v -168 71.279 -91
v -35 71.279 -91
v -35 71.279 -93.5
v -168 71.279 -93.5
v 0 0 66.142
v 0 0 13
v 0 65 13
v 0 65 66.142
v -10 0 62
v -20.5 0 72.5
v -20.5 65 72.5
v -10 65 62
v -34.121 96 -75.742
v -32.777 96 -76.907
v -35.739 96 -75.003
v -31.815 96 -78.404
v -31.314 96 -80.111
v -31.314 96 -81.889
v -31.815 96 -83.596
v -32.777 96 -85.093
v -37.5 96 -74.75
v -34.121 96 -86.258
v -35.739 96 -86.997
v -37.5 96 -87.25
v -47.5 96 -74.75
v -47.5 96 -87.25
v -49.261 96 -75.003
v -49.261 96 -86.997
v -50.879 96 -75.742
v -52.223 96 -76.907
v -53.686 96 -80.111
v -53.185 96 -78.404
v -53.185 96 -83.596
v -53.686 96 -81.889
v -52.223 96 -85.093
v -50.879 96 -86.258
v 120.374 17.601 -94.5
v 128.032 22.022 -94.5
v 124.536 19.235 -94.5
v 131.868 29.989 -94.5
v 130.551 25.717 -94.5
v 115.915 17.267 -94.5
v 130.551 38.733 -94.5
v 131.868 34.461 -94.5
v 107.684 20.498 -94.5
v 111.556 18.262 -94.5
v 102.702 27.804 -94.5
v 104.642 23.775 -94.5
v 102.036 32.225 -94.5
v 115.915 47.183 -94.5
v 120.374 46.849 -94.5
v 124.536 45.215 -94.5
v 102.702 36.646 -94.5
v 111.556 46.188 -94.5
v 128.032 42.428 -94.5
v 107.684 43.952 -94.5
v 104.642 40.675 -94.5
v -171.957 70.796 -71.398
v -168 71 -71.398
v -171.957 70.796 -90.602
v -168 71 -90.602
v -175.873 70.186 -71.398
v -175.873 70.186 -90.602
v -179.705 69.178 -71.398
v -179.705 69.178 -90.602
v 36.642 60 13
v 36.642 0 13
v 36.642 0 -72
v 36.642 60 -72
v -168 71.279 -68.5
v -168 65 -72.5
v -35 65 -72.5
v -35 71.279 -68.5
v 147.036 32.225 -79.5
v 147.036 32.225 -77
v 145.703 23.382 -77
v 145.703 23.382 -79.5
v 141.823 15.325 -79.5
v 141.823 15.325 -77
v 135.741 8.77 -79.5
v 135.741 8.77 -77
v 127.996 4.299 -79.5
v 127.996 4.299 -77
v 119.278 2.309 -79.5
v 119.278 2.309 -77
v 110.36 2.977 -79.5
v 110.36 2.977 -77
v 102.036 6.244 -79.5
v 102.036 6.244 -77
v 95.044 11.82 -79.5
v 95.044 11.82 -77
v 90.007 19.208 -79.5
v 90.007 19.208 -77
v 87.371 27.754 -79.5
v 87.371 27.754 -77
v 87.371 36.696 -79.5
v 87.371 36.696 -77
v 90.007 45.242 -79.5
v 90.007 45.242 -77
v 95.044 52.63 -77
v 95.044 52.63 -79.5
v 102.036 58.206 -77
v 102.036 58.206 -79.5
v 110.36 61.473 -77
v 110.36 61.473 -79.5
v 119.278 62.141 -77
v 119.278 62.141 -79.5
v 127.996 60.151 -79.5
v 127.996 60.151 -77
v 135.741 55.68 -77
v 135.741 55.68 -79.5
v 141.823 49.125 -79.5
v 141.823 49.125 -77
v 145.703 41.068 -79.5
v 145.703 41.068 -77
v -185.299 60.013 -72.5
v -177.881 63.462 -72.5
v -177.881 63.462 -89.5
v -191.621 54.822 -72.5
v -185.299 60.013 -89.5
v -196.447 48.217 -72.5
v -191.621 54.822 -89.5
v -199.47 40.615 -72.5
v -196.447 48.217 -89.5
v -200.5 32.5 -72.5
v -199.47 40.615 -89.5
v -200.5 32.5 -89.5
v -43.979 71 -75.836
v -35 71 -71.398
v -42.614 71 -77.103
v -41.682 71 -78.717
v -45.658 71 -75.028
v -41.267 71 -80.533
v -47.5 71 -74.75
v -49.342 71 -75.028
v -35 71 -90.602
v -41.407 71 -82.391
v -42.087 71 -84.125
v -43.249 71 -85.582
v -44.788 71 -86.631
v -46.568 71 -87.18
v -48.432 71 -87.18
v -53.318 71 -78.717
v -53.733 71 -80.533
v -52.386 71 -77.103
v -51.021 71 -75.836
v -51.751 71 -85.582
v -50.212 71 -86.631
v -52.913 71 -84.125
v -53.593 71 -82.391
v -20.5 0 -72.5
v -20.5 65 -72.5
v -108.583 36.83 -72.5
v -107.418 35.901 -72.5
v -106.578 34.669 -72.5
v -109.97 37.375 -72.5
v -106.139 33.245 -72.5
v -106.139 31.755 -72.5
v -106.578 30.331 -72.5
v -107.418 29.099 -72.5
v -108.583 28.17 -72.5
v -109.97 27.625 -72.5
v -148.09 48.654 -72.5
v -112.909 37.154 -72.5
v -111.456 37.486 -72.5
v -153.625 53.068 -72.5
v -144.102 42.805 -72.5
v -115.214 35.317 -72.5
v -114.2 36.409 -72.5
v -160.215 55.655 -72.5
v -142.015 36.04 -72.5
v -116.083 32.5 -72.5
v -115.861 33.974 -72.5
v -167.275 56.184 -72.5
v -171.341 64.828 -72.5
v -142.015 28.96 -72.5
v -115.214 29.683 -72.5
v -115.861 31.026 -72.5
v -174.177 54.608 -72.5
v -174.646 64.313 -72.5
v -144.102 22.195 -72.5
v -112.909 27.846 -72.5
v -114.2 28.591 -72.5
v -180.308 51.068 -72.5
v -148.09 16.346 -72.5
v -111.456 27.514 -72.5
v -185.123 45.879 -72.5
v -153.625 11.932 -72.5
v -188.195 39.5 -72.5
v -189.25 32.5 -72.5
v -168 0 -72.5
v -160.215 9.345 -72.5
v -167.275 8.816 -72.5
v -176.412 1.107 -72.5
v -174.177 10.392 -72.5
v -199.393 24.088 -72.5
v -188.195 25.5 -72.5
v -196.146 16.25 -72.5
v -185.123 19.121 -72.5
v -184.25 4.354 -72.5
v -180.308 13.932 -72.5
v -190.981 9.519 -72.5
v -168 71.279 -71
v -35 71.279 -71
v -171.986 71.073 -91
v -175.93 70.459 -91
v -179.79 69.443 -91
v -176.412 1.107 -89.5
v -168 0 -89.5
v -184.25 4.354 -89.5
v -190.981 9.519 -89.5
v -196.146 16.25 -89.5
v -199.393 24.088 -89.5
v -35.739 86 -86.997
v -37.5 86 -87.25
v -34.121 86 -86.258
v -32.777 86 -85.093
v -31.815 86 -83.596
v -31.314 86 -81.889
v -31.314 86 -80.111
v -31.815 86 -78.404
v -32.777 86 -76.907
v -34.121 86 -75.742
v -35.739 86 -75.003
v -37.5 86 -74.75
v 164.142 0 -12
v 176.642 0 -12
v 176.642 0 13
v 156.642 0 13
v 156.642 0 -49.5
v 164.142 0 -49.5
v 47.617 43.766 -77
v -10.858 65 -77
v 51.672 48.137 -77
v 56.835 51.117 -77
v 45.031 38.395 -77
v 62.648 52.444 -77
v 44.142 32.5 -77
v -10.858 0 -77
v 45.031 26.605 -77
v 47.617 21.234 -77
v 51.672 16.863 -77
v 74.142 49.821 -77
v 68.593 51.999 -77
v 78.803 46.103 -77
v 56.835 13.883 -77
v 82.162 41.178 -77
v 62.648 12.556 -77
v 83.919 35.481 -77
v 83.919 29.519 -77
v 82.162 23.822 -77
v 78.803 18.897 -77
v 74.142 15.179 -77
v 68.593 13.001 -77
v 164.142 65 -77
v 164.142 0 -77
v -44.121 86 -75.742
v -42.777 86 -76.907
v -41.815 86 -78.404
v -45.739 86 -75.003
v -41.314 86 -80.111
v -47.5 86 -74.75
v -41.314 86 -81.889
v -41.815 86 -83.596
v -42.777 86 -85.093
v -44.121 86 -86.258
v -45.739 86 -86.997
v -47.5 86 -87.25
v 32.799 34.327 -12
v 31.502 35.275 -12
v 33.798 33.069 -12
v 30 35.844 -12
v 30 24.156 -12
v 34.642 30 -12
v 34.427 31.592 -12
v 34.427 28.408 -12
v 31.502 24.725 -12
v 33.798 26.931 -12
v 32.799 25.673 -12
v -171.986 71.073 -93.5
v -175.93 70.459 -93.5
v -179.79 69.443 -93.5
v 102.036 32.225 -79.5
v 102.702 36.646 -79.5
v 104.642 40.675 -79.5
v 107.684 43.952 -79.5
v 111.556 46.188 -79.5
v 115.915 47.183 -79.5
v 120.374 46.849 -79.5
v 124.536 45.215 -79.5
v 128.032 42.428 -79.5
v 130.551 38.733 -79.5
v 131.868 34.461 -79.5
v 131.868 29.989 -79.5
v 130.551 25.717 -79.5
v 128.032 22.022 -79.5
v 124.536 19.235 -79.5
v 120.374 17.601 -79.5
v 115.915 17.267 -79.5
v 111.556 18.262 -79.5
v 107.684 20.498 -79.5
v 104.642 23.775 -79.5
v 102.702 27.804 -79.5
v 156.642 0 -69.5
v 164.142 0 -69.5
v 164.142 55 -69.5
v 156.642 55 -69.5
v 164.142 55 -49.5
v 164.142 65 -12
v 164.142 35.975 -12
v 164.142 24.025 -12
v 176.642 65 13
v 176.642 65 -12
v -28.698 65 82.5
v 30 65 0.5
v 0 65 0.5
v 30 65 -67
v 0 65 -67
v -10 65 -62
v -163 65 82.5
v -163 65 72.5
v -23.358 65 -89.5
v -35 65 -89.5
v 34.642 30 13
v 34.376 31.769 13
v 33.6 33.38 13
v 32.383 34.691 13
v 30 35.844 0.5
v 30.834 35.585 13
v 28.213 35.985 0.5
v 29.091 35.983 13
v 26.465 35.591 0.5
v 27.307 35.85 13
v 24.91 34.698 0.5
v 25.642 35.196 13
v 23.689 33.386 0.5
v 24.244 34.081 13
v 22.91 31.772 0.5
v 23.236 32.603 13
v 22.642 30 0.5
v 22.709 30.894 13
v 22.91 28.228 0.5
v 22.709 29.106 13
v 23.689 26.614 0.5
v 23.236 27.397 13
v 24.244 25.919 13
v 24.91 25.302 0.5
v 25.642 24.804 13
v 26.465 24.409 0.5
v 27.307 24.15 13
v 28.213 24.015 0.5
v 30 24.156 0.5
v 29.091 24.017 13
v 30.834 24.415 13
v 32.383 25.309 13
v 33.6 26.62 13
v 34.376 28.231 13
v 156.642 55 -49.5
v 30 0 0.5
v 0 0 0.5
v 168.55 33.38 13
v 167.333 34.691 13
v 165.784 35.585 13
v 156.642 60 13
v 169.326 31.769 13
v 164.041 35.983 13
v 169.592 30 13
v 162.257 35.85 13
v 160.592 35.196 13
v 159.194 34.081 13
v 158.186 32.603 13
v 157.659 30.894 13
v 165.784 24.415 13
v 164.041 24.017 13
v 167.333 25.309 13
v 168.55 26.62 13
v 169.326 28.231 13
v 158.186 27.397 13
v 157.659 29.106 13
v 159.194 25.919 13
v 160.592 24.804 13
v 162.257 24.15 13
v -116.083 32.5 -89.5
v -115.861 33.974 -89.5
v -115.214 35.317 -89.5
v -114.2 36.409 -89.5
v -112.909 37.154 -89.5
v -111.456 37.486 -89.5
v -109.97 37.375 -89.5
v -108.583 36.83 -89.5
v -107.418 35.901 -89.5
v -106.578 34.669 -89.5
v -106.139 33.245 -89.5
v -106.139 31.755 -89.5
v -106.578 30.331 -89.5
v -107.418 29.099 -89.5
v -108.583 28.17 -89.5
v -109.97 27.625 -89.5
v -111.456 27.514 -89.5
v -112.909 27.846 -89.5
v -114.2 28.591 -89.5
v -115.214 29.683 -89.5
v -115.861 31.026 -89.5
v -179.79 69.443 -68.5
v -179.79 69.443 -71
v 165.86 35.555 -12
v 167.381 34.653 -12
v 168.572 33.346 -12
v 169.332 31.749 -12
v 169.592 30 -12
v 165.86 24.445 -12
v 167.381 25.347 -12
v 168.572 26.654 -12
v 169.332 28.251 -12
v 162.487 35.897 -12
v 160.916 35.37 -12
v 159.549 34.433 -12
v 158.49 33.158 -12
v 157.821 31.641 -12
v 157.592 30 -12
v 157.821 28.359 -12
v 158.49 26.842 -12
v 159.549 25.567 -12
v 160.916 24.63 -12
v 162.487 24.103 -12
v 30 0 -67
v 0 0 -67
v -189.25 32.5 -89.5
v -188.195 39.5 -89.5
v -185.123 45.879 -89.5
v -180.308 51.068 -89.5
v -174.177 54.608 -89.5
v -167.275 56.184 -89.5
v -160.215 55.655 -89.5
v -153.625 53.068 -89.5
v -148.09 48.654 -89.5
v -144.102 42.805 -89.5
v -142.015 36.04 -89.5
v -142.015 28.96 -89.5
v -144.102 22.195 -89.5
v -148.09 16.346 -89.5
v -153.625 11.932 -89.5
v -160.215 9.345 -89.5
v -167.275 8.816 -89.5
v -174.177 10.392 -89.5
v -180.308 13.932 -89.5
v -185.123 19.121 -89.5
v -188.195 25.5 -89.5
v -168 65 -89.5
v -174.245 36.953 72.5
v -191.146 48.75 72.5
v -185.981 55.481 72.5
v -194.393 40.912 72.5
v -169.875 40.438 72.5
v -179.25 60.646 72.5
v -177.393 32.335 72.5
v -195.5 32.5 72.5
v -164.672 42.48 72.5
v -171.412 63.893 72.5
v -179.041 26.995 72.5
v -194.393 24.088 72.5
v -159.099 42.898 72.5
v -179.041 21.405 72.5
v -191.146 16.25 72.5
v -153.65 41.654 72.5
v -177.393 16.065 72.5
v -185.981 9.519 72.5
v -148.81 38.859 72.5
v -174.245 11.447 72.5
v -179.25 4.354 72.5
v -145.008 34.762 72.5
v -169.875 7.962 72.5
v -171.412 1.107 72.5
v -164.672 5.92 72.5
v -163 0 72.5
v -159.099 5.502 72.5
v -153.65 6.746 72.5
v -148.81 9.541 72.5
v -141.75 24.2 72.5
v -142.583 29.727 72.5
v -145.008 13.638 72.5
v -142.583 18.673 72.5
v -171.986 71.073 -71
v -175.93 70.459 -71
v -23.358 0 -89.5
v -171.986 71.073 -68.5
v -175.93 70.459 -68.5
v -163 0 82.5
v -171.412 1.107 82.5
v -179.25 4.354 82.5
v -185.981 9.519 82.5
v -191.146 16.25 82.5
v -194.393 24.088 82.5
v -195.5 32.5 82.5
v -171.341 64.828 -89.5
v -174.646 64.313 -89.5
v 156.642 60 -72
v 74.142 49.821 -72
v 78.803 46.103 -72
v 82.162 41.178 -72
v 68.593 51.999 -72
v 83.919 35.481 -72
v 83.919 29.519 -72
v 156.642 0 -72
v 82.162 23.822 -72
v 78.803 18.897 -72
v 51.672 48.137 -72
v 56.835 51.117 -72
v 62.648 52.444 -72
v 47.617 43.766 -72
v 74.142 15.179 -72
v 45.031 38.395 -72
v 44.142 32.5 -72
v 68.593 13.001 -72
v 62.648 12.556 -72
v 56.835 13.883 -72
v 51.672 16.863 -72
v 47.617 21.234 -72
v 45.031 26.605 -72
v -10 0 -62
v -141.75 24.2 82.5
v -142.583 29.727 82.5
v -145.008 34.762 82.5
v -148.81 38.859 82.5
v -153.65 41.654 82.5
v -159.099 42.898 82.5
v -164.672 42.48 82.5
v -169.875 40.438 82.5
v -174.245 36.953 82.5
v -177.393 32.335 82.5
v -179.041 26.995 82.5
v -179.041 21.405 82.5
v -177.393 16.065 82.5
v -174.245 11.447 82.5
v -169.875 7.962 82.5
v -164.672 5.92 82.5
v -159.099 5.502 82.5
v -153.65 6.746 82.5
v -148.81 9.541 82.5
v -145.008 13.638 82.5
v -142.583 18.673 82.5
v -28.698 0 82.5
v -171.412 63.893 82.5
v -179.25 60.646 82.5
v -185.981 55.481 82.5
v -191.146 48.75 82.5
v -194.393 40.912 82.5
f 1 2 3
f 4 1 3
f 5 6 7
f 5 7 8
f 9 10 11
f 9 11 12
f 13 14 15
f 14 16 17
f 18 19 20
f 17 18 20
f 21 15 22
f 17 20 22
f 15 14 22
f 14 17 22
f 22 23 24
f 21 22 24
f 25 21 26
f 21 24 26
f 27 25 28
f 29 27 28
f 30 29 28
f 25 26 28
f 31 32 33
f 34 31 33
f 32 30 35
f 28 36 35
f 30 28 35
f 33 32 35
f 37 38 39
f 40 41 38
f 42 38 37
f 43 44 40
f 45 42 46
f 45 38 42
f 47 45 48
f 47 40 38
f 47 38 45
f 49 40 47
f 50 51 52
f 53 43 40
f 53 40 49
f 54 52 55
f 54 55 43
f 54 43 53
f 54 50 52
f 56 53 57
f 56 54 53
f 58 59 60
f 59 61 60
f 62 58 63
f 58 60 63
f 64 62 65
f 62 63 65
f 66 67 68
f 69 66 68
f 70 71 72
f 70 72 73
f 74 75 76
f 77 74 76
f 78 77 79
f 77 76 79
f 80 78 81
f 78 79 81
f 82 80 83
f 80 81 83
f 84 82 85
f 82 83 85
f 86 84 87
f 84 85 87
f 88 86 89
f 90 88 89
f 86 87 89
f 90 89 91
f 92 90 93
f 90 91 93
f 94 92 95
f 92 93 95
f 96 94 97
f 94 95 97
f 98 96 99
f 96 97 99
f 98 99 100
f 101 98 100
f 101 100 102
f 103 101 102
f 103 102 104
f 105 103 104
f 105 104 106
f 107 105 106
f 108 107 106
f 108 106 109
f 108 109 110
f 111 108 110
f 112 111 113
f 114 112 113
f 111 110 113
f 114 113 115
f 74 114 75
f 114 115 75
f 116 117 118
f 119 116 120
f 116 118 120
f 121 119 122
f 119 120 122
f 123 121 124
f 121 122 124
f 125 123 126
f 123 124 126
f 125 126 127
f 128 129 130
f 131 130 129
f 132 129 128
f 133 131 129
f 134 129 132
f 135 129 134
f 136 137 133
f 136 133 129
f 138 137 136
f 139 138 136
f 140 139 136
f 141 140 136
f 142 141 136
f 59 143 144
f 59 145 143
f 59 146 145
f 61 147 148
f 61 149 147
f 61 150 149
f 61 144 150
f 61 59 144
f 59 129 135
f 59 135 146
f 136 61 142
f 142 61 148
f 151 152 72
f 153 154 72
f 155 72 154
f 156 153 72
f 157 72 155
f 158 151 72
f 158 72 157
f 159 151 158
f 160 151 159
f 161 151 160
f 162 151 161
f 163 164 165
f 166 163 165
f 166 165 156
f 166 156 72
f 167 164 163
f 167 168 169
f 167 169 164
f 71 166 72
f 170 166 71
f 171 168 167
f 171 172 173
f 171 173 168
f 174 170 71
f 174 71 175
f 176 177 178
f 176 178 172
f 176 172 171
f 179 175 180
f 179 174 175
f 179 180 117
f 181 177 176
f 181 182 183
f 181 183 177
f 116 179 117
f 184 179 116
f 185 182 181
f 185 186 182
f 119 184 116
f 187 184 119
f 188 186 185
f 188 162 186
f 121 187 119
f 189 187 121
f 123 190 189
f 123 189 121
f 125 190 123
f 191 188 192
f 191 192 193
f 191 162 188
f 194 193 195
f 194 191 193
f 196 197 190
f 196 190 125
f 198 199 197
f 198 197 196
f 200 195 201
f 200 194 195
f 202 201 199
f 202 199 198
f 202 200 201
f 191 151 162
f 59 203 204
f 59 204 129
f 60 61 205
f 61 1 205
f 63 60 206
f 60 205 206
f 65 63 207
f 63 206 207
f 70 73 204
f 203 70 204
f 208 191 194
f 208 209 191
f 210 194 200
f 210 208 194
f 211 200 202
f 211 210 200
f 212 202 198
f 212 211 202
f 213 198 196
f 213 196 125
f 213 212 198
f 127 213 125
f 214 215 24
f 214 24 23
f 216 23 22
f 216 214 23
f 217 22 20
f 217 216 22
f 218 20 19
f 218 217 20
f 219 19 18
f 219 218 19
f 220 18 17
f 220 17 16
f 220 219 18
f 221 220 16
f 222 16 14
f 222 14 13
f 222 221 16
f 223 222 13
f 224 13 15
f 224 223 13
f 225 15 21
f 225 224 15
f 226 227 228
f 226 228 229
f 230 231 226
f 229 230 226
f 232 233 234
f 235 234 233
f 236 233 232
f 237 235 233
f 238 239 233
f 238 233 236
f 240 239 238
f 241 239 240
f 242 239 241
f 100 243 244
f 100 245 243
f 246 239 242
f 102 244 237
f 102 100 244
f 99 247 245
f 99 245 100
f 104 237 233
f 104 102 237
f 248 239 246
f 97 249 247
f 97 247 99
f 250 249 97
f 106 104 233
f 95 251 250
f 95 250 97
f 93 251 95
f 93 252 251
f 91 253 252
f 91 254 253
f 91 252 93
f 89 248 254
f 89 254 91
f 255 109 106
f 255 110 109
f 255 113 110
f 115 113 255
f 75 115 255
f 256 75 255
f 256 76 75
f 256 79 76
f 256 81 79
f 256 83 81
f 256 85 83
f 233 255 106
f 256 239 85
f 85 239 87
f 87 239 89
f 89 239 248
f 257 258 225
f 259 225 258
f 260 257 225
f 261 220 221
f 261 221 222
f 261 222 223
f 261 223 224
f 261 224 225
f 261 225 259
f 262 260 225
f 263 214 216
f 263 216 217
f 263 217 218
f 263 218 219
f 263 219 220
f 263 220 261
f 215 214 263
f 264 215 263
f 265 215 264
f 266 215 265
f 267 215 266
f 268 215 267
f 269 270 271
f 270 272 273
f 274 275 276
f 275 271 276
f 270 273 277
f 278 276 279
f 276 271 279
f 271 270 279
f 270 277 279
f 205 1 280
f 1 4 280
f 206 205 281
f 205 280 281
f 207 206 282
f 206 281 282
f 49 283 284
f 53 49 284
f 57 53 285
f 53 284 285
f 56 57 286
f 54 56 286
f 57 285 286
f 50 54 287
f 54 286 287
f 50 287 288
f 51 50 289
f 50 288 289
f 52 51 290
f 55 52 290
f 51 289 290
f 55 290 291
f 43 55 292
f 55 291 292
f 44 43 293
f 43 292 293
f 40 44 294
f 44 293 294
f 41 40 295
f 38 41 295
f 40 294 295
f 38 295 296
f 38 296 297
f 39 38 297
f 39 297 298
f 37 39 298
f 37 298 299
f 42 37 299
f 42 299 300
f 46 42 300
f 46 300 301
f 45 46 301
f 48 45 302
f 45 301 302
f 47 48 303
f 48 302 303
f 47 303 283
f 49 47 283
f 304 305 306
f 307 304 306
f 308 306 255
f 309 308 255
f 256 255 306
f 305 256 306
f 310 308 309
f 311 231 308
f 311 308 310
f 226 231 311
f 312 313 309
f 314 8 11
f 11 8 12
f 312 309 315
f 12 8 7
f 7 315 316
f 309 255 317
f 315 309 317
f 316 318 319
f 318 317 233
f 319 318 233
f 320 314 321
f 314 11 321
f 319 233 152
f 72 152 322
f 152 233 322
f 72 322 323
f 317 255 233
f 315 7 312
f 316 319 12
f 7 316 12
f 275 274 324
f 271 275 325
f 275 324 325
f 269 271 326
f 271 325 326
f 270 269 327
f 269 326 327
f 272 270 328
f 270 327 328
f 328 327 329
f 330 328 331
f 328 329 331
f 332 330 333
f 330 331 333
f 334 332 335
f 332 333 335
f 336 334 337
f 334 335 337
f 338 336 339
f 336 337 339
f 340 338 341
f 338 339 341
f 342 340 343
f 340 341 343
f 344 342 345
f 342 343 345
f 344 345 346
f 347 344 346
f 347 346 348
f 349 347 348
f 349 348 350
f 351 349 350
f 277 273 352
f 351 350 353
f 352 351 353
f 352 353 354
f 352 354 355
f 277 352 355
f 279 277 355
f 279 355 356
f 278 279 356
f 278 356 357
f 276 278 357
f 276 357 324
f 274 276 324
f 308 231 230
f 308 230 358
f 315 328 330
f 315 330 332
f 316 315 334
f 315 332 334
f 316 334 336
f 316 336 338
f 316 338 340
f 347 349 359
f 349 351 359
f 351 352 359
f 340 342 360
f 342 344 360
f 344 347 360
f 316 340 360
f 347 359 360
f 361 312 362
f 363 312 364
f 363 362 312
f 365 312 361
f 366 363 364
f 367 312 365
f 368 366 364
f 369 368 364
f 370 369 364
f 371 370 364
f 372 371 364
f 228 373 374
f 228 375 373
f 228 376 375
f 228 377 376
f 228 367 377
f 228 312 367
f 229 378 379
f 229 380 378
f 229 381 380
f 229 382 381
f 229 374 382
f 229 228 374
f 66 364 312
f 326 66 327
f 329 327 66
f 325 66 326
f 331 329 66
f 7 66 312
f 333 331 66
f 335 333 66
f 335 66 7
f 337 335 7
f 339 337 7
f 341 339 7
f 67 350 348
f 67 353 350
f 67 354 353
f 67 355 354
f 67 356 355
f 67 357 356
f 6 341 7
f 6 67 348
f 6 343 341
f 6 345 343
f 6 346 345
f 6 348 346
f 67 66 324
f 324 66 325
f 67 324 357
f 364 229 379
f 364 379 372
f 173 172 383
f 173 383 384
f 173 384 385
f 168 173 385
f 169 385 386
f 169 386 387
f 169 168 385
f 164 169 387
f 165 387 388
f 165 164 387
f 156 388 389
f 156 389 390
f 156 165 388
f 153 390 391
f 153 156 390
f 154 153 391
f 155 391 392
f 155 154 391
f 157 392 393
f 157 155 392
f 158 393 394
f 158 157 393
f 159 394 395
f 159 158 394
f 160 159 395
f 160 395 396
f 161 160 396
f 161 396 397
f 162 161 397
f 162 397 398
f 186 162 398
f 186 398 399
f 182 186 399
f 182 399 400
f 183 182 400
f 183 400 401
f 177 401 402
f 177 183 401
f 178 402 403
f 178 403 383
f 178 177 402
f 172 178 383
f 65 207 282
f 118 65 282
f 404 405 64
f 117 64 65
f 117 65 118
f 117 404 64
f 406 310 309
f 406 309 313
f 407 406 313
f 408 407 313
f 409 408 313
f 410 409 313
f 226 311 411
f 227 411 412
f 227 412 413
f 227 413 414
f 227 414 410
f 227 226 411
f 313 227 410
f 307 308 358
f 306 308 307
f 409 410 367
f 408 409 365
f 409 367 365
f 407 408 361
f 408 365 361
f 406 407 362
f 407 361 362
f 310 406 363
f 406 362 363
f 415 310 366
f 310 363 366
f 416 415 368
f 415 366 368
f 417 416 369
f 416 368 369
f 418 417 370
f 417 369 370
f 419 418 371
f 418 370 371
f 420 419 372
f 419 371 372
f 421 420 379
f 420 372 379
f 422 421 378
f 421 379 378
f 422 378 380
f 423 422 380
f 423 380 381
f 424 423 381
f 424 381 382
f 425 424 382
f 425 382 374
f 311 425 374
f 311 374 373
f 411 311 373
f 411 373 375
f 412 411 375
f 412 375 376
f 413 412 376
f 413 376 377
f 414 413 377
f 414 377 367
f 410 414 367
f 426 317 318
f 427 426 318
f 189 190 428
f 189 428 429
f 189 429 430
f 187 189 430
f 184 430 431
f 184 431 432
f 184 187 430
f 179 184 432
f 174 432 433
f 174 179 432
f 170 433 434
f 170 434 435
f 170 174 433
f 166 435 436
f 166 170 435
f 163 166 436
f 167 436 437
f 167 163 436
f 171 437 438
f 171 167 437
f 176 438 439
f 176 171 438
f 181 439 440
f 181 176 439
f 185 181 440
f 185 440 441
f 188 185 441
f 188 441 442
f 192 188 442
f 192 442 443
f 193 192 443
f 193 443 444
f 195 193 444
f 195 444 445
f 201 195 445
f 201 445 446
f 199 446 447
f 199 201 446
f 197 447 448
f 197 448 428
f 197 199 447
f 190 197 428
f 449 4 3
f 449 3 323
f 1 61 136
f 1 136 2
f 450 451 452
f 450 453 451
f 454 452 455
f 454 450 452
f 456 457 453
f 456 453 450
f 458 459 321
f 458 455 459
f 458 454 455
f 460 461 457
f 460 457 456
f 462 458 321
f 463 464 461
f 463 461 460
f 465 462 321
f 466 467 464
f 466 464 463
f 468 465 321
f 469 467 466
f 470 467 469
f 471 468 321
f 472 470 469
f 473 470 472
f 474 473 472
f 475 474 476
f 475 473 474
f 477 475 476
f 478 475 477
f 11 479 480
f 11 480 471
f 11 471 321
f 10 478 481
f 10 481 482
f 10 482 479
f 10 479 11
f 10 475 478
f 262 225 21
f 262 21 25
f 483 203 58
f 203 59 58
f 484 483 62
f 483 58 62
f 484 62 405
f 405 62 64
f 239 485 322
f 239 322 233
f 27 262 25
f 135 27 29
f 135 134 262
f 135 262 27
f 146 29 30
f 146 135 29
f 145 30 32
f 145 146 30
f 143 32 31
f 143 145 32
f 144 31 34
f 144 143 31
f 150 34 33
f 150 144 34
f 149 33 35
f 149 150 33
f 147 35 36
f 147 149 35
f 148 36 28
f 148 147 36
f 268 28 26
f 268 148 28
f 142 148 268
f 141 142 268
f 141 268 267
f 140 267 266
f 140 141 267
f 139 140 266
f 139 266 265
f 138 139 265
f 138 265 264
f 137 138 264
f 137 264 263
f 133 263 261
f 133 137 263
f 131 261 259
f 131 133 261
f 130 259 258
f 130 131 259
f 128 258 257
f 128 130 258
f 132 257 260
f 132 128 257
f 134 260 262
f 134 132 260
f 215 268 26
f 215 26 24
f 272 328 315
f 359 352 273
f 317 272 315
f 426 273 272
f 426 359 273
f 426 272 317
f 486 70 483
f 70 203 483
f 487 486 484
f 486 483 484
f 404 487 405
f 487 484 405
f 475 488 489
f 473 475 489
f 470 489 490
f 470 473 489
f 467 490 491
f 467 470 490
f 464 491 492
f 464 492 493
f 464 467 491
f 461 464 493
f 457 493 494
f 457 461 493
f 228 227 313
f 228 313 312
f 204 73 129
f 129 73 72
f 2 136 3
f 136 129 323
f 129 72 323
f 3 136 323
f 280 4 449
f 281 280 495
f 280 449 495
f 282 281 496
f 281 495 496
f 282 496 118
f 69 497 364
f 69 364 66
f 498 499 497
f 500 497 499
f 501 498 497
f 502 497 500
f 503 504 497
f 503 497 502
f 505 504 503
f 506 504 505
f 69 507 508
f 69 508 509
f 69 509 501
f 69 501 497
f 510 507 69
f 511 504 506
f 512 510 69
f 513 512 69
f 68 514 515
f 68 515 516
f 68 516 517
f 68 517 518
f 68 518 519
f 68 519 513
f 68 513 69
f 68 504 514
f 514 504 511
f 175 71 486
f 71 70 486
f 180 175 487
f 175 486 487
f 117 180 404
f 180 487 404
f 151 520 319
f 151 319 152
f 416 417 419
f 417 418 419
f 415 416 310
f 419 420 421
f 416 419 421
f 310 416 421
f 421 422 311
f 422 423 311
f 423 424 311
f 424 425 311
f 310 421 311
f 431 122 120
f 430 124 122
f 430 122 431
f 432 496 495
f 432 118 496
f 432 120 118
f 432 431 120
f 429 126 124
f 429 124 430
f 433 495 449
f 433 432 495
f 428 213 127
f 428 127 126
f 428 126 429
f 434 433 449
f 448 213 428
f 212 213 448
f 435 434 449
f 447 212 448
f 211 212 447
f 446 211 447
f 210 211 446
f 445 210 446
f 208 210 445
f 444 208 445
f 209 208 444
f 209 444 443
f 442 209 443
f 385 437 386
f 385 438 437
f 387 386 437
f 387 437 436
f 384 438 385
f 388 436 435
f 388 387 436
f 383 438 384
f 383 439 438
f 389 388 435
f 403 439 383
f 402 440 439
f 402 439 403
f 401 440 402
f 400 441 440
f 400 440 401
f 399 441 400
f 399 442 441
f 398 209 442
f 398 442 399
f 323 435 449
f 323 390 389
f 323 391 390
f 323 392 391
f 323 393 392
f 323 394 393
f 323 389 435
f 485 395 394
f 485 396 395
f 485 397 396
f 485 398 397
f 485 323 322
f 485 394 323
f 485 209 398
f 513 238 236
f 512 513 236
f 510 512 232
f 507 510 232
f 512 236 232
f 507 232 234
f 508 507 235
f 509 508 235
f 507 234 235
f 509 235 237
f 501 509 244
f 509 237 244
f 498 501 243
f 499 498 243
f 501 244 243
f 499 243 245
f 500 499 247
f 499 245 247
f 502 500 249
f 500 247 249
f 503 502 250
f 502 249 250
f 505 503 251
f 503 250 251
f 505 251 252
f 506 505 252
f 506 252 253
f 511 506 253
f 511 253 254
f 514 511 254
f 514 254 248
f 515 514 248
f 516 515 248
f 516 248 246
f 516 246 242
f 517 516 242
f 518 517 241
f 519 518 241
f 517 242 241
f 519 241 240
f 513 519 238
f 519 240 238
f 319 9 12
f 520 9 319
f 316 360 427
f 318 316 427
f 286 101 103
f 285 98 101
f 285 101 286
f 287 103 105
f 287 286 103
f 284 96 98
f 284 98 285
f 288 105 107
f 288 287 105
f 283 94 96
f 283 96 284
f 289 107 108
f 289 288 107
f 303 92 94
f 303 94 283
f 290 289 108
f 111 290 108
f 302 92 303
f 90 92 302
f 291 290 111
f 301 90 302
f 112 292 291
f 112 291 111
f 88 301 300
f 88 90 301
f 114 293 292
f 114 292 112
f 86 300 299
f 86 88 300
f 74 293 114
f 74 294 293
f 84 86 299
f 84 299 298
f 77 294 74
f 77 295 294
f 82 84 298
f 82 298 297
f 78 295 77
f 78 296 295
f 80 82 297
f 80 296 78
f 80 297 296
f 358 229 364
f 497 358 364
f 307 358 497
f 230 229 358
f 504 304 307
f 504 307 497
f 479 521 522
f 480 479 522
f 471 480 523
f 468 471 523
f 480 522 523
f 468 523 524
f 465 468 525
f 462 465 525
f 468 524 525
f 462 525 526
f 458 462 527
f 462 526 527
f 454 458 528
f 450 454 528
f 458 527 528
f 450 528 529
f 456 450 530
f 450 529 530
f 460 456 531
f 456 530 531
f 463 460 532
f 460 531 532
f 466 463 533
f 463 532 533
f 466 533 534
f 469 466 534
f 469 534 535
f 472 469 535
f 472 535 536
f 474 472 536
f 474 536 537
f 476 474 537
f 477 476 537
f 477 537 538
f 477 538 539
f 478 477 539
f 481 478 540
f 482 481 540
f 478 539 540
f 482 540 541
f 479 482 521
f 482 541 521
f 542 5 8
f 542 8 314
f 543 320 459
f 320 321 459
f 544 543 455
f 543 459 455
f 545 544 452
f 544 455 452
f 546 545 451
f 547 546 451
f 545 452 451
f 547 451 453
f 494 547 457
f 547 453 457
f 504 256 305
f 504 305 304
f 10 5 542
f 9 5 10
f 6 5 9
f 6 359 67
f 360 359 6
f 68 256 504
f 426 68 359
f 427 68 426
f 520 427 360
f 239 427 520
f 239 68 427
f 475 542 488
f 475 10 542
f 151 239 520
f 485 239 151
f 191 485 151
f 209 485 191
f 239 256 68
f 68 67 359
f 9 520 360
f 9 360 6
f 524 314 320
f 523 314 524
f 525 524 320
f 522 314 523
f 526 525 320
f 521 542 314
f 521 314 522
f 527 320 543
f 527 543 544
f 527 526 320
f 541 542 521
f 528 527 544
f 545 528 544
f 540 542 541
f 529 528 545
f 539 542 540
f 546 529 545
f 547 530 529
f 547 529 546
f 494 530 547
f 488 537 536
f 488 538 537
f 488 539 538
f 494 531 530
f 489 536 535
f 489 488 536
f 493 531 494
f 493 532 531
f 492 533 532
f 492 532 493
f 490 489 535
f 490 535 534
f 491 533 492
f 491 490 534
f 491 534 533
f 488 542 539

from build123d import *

# Parameters (mm, degrees)
BOSS_EXTRUDE1_DEPTH = 65
BOSS_EXTRUDE2_DEPTH = 65
SKETCH5_W           = 30
SKETCH5_H           = 67.5
CUT_EXTRUDE1_DEPTH  = 65
SKETCH7_W           = 120
SKETCH7_H           = 85
CUT_EXTRUDE2_DEPTH  = 60
CUT_EXTRUDE3_REACH  = 236.375
SKETCH8_R           = 6
FILLET1_R           = 32.5
SKETCH9_R           = 18.75
CUT_EXTRUDE4_DEPTH  = 10
CUT_EXTRUDE5_START  = -17
SKETCH10_R          = 23.75
SKETCH10_R_2        = 5
CUT_EXTRUDE5_DEPTH  = 17
SKETCH11_W          = 20
SKETCH11_H          = 55
CUT_EXTRUDE6_DEPTH  = 20
SKETCH12_R          = 20
CUT_EXTRUDE7_DEPTH  = 5
SKETCH13_R          = 30
BOSS_EXTRUDE3_DEPTH = 2.5
SKETCH14_R          = 15
BOSS_EXTRUDE4_DEPTH = 15
SKETCH17_R          = 6.25
BOSS_EXTRUDE5_DEPTH = 15
BOSS_EXTRUDE6_DEPTH = 10


with BuildPart() as part:
    # Sketch2 → Boss-Extrude1 (new body)
    with BuildSketch(Plane(origin=(0, 0, 0), x_dir=(1, 0, 0), z_dir=(0, 1, 0))):
        Polygon((0, 66.142135624), (0, -66.142135624), (-28.698430784, -82.5), (-195.5, -82.5), (-195.5, -72.5), (-20.5, -72.5), (-10, -62), (-10, 62), (-20.5, 72.5), (-200.5, 72.5), (-200.5, 89.5), (-23.357864376, 89.5), align=None)
    extrude(amount=BOSS_EXTRUDE1_DEPTH)

    # Sketch3 → Boss-Extrude2 (add)
    with BuildSketch(Plane(origin=(0, 0, 0), x_dir=(1, 0, 0), z_dir=(0, 1, 0))):
        Polygon((164.142135624, 77), (164.142135624, 12), (176.642135624, 12), (176.642135624, -13), (0, -13), (0, 66.142135624), (-10.857864376, 77), align=None)
    extrude(amount=BOSS_EXTRUDE2_DEPTH)

    # Sketch5 → Cut-Extrude1 (cut)
    with BuildSketch(Plane(origin=(0, 0, 0), x_dir=(-1, 0, 0), z_dir=(0, -1, 0))):
        with Locations((-15, 33.25)):
            Rectangle(SKETCH5_W, SKETCH5_H)
    extrude(amount=-CUT_EXTRUDE1_DEPTH, mode=Mode.SUBTRACT)

    # Sketch7 → Cut-Extrude2 (cut)
    with BuildSketch(Plane(origin=(0, 0, 0), x_dir=(-1, 0, 0), z_dir=(0, -1, 0))):
        with Locations((-96.642135624, 29.5)):
            Rectangle(SKETCH7_W, SKETCH7_H)
    extrude(amount=-CUT_EXTRUDE2_DEPTH, mode=Mode.SUBTRACT)

    # Cut-Extrude3: up to this face of the body (flat: up to its plane)
    cut_extrude3_end = Plane(part.part.faces().sort_by_distance((170.392135624, 32.5, -12))[0])
    # Sketch8 → Cut-Extrude3 (cut, up to the picked face)
    with BuildSketch(Plane.XY.offset(13), mode=Mode.PRIVATE) as cut_extrude3_sk1:
        with Locations((28.642135624, 30)):
            Circle(SKETCH8_R)
    cut_extrude3_tool1 = split(extrude(cut_extrude3_sk1.sketch, amount=-CUT_EXTRUDE3_REACH, mode=Mode.PRIVATE), bisect_by=cut_extrude3_end, keep=Keep.BOTH, mode=Mode.PRIVATE)
    # Sketch8 → Cut-Extrude3 (cut, up to the picked face)
    with BuildSketch(Plane.XY.offset(13), mode=Mode.PRIVATE) as cut_extrude3_sk2:
        with Locations((163.592135624, 30)):
            Circle(SKETCH8_R)
    cut_extrude3_tool2 = split(extrude(cut_extrude3_sk2.sketch, amount=-CUT_EXTRUDE3_REACH, mode=Mode.PRIVATE), bisect_by=cut_extrude3_end, keep=Keep.BOTH, mode=Mode.PRIVATE)
    add(cut_extrude3_tool1.solids().sort_by(Axis((28.642136, 30, 13), (0, 0, -1)))[0], mode=Mode.SUBTRACT)
    add(cut_extrude3_tool2.solids().sort_by(Axis((163.592136, 30, 13), (0, 0, -1)))[0], mode=Mode.SUBTRACT)

    # Fillet1
    fillet1_edges = [part.edges().sort_by_distance(p)[0] for p in [
        (-195.5, 65, 77.5),
        (-195.5, 0, 77.5),
        (-200.5, 0, -81),
        (-200.5, 65, -81),
    ]]
    fillet(fillet1_edges, radius=FILLET1_R - 0.0001)  # a hair under: the kernel refuses the full size

    # Sketch9 → Cut-Extrude4 (cut)
    with BuildSketch(Plane.XY.offset(82.5)):
        with Locations((-160.5, 24.2)):
            Circle(SKETCH9_R)
    extrude(amount=-CUT_EXTRUDE4_DEPTH, mode=Mode.SUBTRACT)

    # Sketch10 → Cut-Extrude5 (cut)
    with BuildSketch(Plane(origin=(0, 0, -89.5), x_dir=(-1, 0, 0), z_dir=(0, 0, -1)).offset(CUT_EXTRUDE5_START)):
        with Locations((165.5, 32.5)):
            Circle(SKETCH10_R)
        with Locations((111.08276356, 32.5)):
            Circle(SKETCH10_R_2)
    extrude(amount=CUT_EXTRUDE5_DEPTH, mode=Mode.SUBTRACT)

    # Sketch11 → Cut-Extrude6 (cut)
    with BuildSketch(Plane(origin=(176.642135624, 0, 0), x_dir=(0, 0, -1), z_dir=(1, 0, 0))):
        with Locations((59.5, 27.5)):
            Rectangle(SKETCH11_W, SKETCH11_H)
    extrude(amount=-CUT_EXTRUDE6_DEPTH, mode=Mode.SUBTRACT)

    # Sketch12 → Cut-Extrude7 (cut)
    with BuildSketch(Plane(origin=(0, 0, -77), x_dir=(-1, 0, 0), z_dir=(0, 0, -1))):
        with Locations((-64.142135624, 32.5)):
            Circle(SKETCH12_R)
    extrude(amount=-CUT_EXTRUDE7_DEPTH, mode=Mode.SUBTRACT)

    # Sketch13 → Boss-Extrude3 (add)
    with BuildSketch(Plane(origin=(0, 0, -77), x_dir=(-1, 0, 0), z_dir=(0, 0, -1))):
        with Locations(Location((-117.036013704, 32.225, 0), (0, 0, 180))):
            Circle(SKETCH13_R)
    extrude(amount=BOSS_EXTRUDE3_DEPTH)

    # Sketch14 → Boss-Extrude4 (add)
    with BuildSketch(Plane(origin=(0, 0, -79.5), x_dir=(-1, 0, 0), z_dir=(0, 0, -1))):
        with Locations((-117.036013704, 32.225)):
            Circle(SKETCH14_R)
    extrude(amount=BOSS_EXTRUDE4_DEPTH)

    # Sweep1: sweep along a path in Sketch16
    with BuildLine(Plane(origin=(0, 0, 72.5), x_dir=(-1, 0, 0), z_dir=(0, 0, -1))) as sweep1_path:
        Line((35, 65), (168, 65))
        ThreePointArc((168, 65), (173, 64.613081447), (177.880948137, 63.461538462))
    # Sketch15 → Sweep1 (sweep)
    with BuildSketch(Plane.ZY.offset(35)):
        Polygon((-89.5, 65), (-72.5, 65), (-68.5, 71.278742308), (-71, 71.278742308), (-71.398085272, 71), (-90.601914728, 71), (-91, 71.278742308), (-93.5, 71.278742308), align=None)
    sweep(path=sweep1_path.line)

    # Sketch17 → Boss-Extrude5 (add)
    with BuildSketch(Plane(origin=(0, 71, 0), x_dir=(1, 0, 0), z_dir=(0, 1, 0))):
        with Locations(Location((-47.5, 81, 0), (0, 0, 270))):
            Circle(SKETCH17_R)
    extrude(amount=BOSS_EXTRUDE5_DEPTH)

    # Sketch18 → Boss-Extrude6 (add)
    with BuildSketch(Plane(origin=(0, 86, 0), x_dir=(1, 0, 0), z_dir=(0, 1, 0))):
        with BuildLine():
            Line((-47.5, 87.25), (-37.5, 87.25))
            ThreePointArc((-37.5, 87.25), (-31.25, 81), (-37.5, 74.75))
            Line((-37.5, 74.75), (-47.5, 74.75))
            ThreePointArc((-47.5, 74.75), (-53.75, 81), (-47.5, 87.25))
        make_face()
    extrude(amount=BOSS_EXTRUDE6_DEPTH)


solid = part.part
